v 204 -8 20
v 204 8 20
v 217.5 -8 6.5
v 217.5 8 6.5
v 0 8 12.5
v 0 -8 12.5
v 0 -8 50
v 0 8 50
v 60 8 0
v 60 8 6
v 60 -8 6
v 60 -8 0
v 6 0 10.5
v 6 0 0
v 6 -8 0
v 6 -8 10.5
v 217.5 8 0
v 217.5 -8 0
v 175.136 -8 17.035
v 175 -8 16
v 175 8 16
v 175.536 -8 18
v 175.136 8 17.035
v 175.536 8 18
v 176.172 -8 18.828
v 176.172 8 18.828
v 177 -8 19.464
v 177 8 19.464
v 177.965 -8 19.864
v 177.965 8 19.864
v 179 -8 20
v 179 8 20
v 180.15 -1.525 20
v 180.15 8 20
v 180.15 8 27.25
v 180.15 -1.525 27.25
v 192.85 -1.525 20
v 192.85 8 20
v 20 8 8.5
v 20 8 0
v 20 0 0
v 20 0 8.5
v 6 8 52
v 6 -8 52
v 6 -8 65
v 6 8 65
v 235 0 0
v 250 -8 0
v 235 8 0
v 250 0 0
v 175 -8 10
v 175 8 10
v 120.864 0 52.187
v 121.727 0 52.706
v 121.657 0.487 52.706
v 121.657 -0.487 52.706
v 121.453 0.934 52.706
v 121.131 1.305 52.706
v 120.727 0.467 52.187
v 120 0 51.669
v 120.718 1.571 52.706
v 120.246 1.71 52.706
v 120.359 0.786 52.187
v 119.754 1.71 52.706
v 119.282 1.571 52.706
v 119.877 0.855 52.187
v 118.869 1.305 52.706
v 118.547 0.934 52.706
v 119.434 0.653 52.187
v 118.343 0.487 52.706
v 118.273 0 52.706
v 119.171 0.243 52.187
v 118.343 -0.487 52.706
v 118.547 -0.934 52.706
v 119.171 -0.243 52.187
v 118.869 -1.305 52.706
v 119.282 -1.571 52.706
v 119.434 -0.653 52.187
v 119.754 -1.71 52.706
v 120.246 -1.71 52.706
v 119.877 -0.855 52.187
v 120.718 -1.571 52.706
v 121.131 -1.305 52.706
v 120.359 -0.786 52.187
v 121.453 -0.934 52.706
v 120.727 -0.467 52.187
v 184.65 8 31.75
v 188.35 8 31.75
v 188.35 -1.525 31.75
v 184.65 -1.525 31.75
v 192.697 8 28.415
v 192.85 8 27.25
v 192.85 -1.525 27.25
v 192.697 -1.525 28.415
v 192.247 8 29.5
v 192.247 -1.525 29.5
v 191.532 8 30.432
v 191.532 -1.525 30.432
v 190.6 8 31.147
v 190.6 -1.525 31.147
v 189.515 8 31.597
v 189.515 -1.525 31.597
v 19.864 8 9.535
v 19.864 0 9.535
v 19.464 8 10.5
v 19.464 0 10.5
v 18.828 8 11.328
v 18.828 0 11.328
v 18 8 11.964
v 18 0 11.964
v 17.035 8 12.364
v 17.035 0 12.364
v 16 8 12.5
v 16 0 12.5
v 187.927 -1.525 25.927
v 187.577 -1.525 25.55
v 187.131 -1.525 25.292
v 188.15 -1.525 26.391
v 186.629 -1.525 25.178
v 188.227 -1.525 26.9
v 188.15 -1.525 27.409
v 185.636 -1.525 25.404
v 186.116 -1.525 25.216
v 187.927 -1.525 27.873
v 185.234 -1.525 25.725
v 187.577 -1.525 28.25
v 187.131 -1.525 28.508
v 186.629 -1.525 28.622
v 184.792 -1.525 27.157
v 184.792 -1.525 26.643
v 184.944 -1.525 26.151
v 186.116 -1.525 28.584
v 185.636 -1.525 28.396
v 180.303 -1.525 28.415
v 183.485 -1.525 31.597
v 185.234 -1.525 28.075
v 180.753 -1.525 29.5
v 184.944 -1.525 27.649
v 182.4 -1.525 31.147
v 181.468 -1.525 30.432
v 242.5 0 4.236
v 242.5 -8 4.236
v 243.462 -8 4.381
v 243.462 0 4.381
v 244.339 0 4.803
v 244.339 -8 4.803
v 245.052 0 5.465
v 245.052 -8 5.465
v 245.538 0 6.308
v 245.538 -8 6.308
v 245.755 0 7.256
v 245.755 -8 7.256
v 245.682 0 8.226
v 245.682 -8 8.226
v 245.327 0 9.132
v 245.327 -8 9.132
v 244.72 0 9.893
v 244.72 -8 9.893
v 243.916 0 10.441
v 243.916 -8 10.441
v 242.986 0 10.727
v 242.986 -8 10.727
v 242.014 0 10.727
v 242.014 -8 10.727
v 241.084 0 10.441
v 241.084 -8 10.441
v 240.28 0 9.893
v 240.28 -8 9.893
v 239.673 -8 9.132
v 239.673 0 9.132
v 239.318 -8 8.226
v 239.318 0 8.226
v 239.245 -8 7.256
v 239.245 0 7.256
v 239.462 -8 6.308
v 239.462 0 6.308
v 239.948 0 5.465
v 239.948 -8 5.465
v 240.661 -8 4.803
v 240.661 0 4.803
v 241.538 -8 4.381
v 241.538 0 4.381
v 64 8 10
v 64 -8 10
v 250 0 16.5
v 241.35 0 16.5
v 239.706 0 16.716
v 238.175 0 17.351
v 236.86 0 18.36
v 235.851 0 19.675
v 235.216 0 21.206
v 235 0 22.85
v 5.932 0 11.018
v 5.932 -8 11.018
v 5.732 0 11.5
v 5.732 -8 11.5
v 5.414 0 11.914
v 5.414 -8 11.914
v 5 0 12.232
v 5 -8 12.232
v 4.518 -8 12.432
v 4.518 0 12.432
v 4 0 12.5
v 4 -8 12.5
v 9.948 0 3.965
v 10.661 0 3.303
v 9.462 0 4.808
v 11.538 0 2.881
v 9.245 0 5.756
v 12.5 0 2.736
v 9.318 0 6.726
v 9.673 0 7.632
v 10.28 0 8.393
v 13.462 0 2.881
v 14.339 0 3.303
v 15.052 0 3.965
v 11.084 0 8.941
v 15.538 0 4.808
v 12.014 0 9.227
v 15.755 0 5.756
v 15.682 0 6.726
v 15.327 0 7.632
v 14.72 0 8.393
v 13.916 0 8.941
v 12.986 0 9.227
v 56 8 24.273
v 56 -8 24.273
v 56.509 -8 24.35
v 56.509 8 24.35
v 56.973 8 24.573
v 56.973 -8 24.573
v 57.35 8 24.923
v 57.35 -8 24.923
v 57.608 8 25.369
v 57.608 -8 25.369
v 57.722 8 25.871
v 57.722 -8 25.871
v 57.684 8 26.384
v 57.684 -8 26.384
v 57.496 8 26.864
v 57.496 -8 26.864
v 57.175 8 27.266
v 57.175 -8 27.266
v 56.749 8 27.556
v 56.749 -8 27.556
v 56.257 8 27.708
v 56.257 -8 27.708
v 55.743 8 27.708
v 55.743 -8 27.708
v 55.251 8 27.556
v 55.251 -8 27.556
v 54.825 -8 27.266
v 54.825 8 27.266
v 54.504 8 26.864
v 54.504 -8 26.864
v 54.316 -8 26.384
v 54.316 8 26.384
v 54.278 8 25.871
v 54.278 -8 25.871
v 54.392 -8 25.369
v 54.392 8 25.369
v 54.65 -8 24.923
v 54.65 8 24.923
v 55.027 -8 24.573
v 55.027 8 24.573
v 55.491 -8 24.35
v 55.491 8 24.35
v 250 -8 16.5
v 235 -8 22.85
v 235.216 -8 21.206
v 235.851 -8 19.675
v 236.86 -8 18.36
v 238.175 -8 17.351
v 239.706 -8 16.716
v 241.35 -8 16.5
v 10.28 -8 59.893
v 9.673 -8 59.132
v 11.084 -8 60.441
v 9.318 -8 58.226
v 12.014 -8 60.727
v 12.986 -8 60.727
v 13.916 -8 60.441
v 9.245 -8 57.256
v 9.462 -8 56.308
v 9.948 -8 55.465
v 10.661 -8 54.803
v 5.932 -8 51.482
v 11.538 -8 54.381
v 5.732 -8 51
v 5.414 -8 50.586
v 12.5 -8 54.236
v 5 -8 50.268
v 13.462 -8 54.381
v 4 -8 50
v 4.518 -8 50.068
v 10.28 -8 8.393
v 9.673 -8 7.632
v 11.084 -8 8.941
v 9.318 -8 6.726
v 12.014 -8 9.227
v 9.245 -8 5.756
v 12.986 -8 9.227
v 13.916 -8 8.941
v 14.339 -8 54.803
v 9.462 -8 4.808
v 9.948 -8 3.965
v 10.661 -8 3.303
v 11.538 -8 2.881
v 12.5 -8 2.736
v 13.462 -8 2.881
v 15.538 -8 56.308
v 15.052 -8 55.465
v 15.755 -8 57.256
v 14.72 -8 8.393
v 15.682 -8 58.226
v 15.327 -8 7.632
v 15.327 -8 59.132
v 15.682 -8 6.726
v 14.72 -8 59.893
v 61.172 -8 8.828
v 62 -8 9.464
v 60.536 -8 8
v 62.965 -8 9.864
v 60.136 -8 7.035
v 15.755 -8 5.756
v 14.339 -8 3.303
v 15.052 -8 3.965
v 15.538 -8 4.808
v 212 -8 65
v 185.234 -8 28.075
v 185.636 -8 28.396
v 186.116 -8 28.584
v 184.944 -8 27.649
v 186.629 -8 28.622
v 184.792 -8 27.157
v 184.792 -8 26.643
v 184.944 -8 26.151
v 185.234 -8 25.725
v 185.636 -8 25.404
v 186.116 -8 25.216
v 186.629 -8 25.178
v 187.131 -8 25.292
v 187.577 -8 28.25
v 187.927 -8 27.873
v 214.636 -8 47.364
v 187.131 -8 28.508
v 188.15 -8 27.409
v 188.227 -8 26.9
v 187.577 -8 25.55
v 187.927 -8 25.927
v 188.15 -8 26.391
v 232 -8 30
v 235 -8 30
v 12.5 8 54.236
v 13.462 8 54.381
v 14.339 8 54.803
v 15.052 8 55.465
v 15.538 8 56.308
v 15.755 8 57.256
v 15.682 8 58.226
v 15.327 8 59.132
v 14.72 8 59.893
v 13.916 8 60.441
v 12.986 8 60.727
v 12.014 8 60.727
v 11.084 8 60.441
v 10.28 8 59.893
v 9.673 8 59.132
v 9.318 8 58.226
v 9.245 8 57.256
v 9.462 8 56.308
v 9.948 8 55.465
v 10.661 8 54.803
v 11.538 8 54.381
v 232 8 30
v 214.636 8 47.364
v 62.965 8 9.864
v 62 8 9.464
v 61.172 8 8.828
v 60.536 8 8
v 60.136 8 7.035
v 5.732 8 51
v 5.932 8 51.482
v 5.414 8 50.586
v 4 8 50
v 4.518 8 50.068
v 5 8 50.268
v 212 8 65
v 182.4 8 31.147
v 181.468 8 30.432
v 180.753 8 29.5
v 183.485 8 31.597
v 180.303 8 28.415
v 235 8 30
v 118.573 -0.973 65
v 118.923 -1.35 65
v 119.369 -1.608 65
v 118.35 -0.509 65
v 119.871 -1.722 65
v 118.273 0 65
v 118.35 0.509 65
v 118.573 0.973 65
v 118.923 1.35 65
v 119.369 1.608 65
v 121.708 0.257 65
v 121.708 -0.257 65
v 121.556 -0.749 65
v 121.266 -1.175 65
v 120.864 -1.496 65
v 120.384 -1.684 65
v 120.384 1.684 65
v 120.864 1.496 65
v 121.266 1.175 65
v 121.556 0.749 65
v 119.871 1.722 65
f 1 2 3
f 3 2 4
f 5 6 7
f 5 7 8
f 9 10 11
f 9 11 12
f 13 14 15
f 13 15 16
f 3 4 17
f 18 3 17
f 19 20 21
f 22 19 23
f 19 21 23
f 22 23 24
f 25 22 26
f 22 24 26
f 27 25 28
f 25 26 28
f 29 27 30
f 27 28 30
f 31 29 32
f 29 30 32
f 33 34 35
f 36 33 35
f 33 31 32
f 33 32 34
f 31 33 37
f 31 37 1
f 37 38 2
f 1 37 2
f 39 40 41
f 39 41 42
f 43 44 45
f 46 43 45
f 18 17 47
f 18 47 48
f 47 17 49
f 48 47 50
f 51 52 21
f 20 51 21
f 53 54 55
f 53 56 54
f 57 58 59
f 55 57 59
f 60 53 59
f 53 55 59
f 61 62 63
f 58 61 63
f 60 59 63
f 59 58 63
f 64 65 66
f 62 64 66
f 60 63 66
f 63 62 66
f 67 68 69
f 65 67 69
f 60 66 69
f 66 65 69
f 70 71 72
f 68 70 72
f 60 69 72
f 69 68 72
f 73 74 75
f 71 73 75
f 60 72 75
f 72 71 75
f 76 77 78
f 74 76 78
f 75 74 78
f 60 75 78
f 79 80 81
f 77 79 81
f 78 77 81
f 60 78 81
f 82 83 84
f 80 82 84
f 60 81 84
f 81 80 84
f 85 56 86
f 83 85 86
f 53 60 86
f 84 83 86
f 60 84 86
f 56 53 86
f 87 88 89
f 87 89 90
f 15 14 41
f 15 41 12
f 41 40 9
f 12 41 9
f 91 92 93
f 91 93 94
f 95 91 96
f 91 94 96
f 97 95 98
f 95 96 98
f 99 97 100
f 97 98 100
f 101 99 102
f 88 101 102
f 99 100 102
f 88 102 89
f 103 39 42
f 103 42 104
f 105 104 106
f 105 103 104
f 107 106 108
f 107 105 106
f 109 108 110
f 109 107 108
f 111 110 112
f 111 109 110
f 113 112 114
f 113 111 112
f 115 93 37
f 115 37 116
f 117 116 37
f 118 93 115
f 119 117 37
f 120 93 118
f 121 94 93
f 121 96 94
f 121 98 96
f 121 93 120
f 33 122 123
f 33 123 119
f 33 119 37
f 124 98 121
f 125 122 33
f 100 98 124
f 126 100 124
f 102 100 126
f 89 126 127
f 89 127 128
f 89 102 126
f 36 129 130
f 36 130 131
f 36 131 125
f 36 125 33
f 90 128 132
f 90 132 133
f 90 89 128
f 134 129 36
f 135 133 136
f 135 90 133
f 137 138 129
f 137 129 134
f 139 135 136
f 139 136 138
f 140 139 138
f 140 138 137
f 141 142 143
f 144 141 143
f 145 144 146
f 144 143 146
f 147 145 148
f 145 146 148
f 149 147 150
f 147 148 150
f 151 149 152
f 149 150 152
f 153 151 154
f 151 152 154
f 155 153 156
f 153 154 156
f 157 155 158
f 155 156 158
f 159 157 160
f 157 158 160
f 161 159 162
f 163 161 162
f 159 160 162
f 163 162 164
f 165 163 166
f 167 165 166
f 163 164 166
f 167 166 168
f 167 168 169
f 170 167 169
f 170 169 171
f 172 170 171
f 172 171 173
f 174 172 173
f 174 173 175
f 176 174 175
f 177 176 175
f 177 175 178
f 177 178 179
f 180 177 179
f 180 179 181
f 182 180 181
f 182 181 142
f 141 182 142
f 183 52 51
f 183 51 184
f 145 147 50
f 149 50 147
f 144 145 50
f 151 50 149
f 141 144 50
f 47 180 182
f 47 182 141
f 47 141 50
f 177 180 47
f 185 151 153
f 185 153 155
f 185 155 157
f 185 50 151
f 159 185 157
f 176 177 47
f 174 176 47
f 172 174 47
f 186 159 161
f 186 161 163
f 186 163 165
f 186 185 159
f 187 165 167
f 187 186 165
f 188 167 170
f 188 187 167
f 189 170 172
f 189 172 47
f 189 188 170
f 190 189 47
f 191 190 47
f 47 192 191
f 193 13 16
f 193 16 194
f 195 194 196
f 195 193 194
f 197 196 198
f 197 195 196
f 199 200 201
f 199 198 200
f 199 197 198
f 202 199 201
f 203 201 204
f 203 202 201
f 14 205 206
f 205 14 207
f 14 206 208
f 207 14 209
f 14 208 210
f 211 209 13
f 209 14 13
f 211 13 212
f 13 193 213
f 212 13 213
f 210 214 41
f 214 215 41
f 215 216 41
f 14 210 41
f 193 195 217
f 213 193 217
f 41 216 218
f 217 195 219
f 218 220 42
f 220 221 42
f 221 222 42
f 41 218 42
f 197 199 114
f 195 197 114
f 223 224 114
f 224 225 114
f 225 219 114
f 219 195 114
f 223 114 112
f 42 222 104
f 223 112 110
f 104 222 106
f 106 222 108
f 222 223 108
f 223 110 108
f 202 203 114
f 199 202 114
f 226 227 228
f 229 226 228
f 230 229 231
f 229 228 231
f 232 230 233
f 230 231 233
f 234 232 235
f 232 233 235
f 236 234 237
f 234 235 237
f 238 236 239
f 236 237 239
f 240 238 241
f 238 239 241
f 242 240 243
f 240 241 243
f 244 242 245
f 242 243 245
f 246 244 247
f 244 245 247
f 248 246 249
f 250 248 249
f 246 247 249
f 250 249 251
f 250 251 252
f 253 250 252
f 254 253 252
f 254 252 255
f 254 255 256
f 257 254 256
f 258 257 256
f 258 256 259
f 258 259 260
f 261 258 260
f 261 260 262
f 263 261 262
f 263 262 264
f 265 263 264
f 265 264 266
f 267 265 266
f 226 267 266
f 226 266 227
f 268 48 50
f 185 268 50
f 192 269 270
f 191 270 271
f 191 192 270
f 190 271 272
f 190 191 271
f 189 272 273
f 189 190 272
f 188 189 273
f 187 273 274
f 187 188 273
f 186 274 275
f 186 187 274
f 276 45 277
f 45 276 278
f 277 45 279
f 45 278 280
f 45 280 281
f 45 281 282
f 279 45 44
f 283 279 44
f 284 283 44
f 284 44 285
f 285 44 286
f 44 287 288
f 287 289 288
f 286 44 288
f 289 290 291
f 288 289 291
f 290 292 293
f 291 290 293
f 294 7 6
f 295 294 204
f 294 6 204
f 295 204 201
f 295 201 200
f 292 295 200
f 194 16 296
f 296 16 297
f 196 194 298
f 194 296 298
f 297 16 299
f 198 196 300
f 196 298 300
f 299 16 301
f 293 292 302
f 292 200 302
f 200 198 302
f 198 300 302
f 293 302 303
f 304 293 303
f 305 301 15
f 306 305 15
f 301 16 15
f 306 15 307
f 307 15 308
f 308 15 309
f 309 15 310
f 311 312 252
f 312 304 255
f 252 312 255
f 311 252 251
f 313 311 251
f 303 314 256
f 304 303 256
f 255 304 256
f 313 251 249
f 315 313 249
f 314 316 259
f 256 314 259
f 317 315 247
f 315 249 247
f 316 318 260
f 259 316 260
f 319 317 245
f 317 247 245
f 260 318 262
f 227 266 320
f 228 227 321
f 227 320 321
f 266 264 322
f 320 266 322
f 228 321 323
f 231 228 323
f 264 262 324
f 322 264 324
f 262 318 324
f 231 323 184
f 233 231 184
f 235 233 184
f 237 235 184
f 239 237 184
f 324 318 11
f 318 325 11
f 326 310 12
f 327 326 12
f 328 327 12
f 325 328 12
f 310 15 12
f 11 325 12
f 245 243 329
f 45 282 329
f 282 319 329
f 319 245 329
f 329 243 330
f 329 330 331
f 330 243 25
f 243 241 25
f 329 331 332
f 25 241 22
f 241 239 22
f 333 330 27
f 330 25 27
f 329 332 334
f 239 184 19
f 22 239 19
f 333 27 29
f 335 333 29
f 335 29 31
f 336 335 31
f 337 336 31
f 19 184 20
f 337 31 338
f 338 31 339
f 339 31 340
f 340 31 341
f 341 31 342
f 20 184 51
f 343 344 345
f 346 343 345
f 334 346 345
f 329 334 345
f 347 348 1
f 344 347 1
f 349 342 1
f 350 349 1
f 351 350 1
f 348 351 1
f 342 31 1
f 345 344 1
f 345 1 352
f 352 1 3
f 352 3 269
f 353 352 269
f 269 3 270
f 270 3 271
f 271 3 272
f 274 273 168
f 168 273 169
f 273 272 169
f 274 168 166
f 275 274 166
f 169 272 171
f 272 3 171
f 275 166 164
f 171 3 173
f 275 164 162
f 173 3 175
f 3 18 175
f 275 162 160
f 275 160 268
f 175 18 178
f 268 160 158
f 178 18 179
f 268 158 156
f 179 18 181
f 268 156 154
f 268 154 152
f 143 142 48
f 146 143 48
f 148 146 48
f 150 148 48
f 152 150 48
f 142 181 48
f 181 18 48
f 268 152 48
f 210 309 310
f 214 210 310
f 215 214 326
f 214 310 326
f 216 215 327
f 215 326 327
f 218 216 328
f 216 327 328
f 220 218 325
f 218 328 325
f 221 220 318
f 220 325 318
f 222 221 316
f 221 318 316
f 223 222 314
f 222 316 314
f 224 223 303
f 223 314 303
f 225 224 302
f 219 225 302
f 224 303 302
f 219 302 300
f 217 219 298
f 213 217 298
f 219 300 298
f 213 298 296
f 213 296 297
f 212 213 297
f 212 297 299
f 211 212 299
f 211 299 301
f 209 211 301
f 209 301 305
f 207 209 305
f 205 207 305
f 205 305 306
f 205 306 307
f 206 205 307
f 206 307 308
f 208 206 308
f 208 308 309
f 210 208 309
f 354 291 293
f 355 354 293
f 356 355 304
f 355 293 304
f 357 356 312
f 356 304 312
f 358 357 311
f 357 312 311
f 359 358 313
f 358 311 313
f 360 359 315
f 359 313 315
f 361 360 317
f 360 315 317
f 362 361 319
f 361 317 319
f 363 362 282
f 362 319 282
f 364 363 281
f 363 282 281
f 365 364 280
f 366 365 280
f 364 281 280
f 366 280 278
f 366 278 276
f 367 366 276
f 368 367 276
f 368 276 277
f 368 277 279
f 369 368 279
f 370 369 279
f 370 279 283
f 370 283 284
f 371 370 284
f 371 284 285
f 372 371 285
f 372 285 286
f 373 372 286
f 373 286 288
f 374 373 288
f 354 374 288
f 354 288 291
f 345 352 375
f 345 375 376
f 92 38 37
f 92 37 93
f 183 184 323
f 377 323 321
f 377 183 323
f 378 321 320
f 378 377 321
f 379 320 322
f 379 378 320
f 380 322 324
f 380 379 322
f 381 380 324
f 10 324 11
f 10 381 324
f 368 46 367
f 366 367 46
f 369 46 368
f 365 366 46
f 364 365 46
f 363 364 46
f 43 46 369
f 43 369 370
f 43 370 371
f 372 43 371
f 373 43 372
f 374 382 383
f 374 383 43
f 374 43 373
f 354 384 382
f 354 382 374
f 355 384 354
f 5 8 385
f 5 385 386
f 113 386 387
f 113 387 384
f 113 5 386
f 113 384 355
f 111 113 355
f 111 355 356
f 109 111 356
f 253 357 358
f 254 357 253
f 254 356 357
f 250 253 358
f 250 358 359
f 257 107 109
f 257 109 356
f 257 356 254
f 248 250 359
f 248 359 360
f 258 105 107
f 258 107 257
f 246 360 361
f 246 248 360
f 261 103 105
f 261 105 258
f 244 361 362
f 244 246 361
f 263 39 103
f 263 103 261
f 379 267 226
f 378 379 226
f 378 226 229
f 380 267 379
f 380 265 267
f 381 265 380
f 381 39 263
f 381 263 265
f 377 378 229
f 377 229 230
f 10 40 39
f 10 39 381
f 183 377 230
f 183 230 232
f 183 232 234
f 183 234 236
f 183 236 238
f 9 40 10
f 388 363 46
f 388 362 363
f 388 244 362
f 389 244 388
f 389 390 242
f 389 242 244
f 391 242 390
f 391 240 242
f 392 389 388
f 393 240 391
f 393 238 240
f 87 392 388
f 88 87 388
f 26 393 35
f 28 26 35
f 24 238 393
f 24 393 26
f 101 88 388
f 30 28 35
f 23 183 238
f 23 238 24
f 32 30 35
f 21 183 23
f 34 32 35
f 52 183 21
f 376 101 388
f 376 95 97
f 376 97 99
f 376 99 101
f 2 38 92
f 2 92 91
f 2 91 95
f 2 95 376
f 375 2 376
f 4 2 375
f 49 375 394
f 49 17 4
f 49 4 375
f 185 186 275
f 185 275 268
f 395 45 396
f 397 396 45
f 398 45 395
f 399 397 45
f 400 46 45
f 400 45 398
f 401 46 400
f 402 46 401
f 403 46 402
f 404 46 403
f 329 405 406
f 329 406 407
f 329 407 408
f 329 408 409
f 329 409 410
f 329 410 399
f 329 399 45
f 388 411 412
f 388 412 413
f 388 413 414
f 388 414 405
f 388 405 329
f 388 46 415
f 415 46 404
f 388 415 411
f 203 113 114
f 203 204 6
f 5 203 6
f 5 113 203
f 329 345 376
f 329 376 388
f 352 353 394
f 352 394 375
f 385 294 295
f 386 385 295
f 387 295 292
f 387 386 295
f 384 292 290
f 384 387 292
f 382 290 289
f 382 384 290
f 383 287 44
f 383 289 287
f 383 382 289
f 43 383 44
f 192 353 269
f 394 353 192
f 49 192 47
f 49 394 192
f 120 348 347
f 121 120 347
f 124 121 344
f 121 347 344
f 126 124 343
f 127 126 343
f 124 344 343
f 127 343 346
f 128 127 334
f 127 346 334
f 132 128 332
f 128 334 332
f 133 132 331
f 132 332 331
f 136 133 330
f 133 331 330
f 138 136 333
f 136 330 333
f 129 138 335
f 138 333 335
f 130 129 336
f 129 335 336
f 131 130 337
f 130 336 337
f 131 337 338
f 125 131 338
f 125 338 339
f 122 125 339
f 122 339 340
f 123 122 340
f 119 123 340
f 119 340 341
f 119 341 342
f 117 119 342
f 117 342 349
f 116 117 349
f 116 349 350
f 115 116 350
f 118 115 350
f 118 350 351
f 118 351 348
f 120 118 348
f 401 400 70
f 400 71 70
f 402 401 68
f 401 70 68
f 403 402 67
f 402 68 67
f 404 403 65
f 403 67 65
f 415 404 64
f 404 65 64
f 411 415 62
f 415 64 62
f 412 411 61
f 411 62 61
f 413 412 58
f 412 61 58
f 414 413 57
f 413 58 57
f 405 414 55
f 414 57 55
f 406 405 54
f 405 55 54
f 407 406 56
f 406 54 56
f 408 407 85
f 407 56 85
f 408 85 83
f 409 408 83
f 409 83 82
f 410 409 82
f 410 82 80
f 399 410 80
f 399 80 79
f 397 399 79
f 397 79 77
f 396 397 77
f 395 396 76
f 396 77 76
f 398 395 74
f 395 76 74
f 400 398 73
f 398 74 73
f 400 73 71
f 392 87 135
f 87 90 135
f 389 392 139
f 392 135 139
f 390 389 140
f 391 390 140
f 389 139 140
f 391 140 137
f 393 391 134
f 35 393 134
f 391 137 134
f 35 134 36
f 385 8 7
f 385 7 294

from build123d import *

# Parameters (mm, degrees)
SKETCH1_W                          = 250
SKETCH1_H                          = 16
BASE_EXTRUDE_DEPTH                 = 65
ACCESS_START                       = -16
ACCESS_FOR_BLADE_CLAMP_BOLTS_DEPTH = 16
CUT_EXTRUDE2_DEPTH                 = 17
CUT_EXTRUDE3_DEPTH                 = 17
F_1_4_CLEARANCE_HOLE1_D            = 6.5278
CUT_EXTRUDE4_DEPTH                 = 17
CUT_EXTRUDE5_DEPTH                 = 8
F_8_32_TAPPED_HOLE1_D              = 3.4544
F_8_32_TAPPED_HOLE2_D              = 3.4544
F_8_32_TAPPED_HOLE2_DEPTH          = 12.2936
F_8_32_TAPPED_HOLE2_TIP            = 1.037806461
F_8_32_TAPPED_HOLE3_D              = 3.4544
SKETCH20_W                         = 15
SKETCH20_H                         = 30
CUT_EXTRUDE6_DEPTH                 = 8
SKETCH22_W                         = 12.7
SKETCH22_H                         = 11.75
CUT_EXTRUDE8_DEPTH                 = 9.525
CUT_EXTRUDE9_DEPTH                 = 9
FILLET1_R                          = 4.5


with BuildPart() as part:
    # Sketch1 → Base-Extrude (new body)
    with BuildSketch(Plane.XY):
        with Locations((125, 0)):
            Rectangle(SKETCH1_W, SKETCH1_H)
    extrude(amount=BASE_EXTRUDE_DEPTH)

    # Sketch3 → Access for Blade Clamp Bolts (cut)
    with BuildSketch(Plane(origin=(0, 8, 0), x_dir=(-1, 0, 0), z_dir=(0, 1, 0)).offset(ACCESS_START)):
        Polygon((-764.876222455, 30), (-250, 30), (-232, 30), (-214.635668285, 47.364331715), (-212, 65), (-135.896448754, 574.220751675), (-809.679729524, 1352.941618451), (-1438.659503225, 808.720866775), align=None)
    extrude(amount=ACCESS_FOR_BLADE_CLAMP_BOLTS_DEPTH, mode=Mode.SUBTRACT)

    # Sketch6 → Cut-Extrude2 (cut, through all)
    with BuildSketch(Plane(origin=(0, 8, 0), x_dir=(-1, 0, 0), z_dir=(0, 1, 0))):
        with BuildLine():
            Line((-60, 0), (-110, 0))
            Line((-110, 0), (-110, 10))
            Line((-110, 10), (-64, 10))
            ThreePointArc((-64, 10), (-61.171572875, 8.828427125), (-60, 6))
            Line((-60, 6), (-60, 0))
        make_face()
        with BuildLine():
            Line((110, 0), (110, 6))
            ThreePointArc((110, 6), (108.828427125, 8.828427125), (106, 10))
            Line((106, 10), (64, 10))
            ThreePointArc((64, 10), (61.171572875, 8.828427125), (60, 6))
            Line((60, 6), (60, 0))
            Line((60, 0), (110, 0))
        make_face()
    extrude(amount=-CUT_EXTRUDE2_DEPTH, mode=Mode.SUBTRACT)

    # Sketch7 → Cut-Extrude3 (cut, through all)
    with BuildSketch(Plane(origin=(0, 8, 0), x_dir=(-1, 0, 0), z_dir=(0, 1, 0))):
        with BuildLine():
            Line((-217.5, 0), (-110, 0))
            Line((-110, 0), (-110, 10))
            Line((-110, 10), (-175, 10))
            Line((-175, 10), (-175, 16))
            ThreePointArc((-175, 16), (-176.171572875, 18.828427125), (-179, 20))
            Line((-179, 20), (-204, 20))
            Line((-204, 20), (-217.5, 6.5))
            Line((-217.5, 6.5), (-217.5, 5))
            Line((-217.5, 5), (-217.5, 0))
        make_face()
    extrude(amount=-CUT_EXTRUDE3_DEPTH, mode=Mode.SUBTRACT)

    # 1/4 Clearance Hole1 (through all)
    with Locations(Plane(origin=(242.5, 8, 22.5), x_dir=(0, 0, 1), z_dir=(0, 1, 0))):
        with Locations((0, 0), (35, -230), (-16.5, -230), (-15, 0)):
            Hole(F_1_4_CLEARANCE_HOLE1_D / 2)

    # Sketch11 → Cut-Extrude4 (cut, through all)
    with BuildSketch(Plane(origin=(0, 8, 0), x_dir=(-1, 0, 0), z_dir=(0, 1, 0))):
        with BuildLine():
            Line((0, 65), (0, 50))
            Line((0, 50), (-4, 50))
            ThreePointArc((-4, 50), (-5.414213562, 50.585786438), (-6, 52))
            Line((-6, 52), (-6, 65))
            Line((-6, 65), (0, 65))
        make_face()
        with BuildLine():
            Line((0, 0), (-6, 0))
            Line((-6, 0), (-6, 10.5))
            ThreePointArc((-6, 10.5), (-5.414213562, 11.914213562), (-4, 12.5))
            Line((-4, 12.5), (0, 12.5))
            Line((0, 12.5), (0, 0))
        make_face()
    extrude(amount=-CUT_EXTRUDE4_DEPTH, mode=Mode.SUBTRACT)

    # Sketch12 → Cut-Extrude5 (cut)
    with BuildSketch(Plane(origin=(0, 8, 0), x_dir=(-1, 0, 0), z_dir=(0, 1, 0))):
        with BuildLine():
            Line((0, 0), (-20, 0))
            Line((-20, 0), (-20, 8.5))
            ThreePointArc((-20, 8.5), (-18.828427125, 11.328427125), (-16, 12.5))
            Line((-16, 12.5), (0, 12.5))
            Line((0, 12.5), (0, 0))
        make_face()
    extrude(amount=-CUT_EXTRUDE5_DEPTH, mode=Mode.SUBTRACT)

    # #8-32 Tapped Hole1 (through all)
    with Locations(Plane(origin=(56, 8, 26), x_dir=(0, 0, 1), z_dir=(0, 1, 0))):
        with Locations((0, 0)):
            Hole(F_8_32_TAPPED_HOLE1_D / 2)

    # #8-32 Tapped Hole2
    with Locations(Plane.XY.offset(65)):
        with Locations((120, 0)):
            Hole(F_8_32_TAPPED_HOLE2_D / 2, depth=F_8_32_TAPPED_HOLE2_DEPTH)
            with Locations((0, 0, -(F_8_32_TAPPED_HOLE2_DEPTH + F_8_32_TAPPED_HOLE2_TIP / 2))):  # 118° drill point
                Cone(0, F_8_32_TAPPED_HOLE2_D / 2, F_8_32_TAPPED_HOLE2_TIP, mode=Mode.SUBTRACT)

    # #8-32 Tapped Hole3 (through all)
    with Locations(Plane(origin=(0, 8, 0), x_dir=(-1, 0, 0), z_dir=(0, 1, 0))):
        with Locations((-186.5, 26.9)):
            Hole(F_8_32_TAPPED_HOLE3_D / 2)

    # Sketch20 → Cut-Extrude6 (cut)
    with BuildSketch(Plane(origin=(0, 8, 0), x_dir=(-1, 0, 0), z_dir=(0, 1, 0))):
        with Locations((-242.5, 15)):
            Rectangle(SKETCH20_W, SKETCH20_H)
    extrude(amount=-CUT_EXTRUDE6_DEPTH, mode=Mode.SUBTRACT)

    # Sketch22 → Cut-Extrude8 (cut)
    with BuildSketch(Plane(origin=(0, 8, 0), x_dir=(-1, 0, 0), z_dir=(0, 1, 0))):
        with Locations((-186.5, 25.875)):
            Rectangle(SKETCH22_W, SKETCH22_H)
    extrude(amount=-CUT_EXTRUDE8_DEPTH, mode=Mode.SUBTRACT)

    # Sketch23 → Cut-Extrude9 (cut, through all)
    with BuildSketch(Plane(origin=(0, 0, 0), x_dir=(-1, 0, 0), z_dir=(0, 1, 0))):
        with BuildLine():
            Line((-241.35, 16.5), (-250, 16.5))
            Line((-250, 16.5), (-250, 30))
            Line((-250, 30), (-235, 30))
            Line((-235, 30), (-235, 22.85))
            ThreePointArc((-235, 22.85), (-236.859871939, 18.359871939), (-241.35, 16.5))
        make_face()
    extrude(amount=-CUT_EXTRUDE9_DEPTH, mode=Mode.SUBTRACT)

    # Fillet1
    fillet1_edges = [part.edges().sort_by_distance(p)[0] for p in [
        (180.15, 3.2375, 31.75),
        (192.85, 3.2375, 31.75),
    ]]
    fillet(fillet1_edges, radius=FILLET1_R)


solid = part.part
